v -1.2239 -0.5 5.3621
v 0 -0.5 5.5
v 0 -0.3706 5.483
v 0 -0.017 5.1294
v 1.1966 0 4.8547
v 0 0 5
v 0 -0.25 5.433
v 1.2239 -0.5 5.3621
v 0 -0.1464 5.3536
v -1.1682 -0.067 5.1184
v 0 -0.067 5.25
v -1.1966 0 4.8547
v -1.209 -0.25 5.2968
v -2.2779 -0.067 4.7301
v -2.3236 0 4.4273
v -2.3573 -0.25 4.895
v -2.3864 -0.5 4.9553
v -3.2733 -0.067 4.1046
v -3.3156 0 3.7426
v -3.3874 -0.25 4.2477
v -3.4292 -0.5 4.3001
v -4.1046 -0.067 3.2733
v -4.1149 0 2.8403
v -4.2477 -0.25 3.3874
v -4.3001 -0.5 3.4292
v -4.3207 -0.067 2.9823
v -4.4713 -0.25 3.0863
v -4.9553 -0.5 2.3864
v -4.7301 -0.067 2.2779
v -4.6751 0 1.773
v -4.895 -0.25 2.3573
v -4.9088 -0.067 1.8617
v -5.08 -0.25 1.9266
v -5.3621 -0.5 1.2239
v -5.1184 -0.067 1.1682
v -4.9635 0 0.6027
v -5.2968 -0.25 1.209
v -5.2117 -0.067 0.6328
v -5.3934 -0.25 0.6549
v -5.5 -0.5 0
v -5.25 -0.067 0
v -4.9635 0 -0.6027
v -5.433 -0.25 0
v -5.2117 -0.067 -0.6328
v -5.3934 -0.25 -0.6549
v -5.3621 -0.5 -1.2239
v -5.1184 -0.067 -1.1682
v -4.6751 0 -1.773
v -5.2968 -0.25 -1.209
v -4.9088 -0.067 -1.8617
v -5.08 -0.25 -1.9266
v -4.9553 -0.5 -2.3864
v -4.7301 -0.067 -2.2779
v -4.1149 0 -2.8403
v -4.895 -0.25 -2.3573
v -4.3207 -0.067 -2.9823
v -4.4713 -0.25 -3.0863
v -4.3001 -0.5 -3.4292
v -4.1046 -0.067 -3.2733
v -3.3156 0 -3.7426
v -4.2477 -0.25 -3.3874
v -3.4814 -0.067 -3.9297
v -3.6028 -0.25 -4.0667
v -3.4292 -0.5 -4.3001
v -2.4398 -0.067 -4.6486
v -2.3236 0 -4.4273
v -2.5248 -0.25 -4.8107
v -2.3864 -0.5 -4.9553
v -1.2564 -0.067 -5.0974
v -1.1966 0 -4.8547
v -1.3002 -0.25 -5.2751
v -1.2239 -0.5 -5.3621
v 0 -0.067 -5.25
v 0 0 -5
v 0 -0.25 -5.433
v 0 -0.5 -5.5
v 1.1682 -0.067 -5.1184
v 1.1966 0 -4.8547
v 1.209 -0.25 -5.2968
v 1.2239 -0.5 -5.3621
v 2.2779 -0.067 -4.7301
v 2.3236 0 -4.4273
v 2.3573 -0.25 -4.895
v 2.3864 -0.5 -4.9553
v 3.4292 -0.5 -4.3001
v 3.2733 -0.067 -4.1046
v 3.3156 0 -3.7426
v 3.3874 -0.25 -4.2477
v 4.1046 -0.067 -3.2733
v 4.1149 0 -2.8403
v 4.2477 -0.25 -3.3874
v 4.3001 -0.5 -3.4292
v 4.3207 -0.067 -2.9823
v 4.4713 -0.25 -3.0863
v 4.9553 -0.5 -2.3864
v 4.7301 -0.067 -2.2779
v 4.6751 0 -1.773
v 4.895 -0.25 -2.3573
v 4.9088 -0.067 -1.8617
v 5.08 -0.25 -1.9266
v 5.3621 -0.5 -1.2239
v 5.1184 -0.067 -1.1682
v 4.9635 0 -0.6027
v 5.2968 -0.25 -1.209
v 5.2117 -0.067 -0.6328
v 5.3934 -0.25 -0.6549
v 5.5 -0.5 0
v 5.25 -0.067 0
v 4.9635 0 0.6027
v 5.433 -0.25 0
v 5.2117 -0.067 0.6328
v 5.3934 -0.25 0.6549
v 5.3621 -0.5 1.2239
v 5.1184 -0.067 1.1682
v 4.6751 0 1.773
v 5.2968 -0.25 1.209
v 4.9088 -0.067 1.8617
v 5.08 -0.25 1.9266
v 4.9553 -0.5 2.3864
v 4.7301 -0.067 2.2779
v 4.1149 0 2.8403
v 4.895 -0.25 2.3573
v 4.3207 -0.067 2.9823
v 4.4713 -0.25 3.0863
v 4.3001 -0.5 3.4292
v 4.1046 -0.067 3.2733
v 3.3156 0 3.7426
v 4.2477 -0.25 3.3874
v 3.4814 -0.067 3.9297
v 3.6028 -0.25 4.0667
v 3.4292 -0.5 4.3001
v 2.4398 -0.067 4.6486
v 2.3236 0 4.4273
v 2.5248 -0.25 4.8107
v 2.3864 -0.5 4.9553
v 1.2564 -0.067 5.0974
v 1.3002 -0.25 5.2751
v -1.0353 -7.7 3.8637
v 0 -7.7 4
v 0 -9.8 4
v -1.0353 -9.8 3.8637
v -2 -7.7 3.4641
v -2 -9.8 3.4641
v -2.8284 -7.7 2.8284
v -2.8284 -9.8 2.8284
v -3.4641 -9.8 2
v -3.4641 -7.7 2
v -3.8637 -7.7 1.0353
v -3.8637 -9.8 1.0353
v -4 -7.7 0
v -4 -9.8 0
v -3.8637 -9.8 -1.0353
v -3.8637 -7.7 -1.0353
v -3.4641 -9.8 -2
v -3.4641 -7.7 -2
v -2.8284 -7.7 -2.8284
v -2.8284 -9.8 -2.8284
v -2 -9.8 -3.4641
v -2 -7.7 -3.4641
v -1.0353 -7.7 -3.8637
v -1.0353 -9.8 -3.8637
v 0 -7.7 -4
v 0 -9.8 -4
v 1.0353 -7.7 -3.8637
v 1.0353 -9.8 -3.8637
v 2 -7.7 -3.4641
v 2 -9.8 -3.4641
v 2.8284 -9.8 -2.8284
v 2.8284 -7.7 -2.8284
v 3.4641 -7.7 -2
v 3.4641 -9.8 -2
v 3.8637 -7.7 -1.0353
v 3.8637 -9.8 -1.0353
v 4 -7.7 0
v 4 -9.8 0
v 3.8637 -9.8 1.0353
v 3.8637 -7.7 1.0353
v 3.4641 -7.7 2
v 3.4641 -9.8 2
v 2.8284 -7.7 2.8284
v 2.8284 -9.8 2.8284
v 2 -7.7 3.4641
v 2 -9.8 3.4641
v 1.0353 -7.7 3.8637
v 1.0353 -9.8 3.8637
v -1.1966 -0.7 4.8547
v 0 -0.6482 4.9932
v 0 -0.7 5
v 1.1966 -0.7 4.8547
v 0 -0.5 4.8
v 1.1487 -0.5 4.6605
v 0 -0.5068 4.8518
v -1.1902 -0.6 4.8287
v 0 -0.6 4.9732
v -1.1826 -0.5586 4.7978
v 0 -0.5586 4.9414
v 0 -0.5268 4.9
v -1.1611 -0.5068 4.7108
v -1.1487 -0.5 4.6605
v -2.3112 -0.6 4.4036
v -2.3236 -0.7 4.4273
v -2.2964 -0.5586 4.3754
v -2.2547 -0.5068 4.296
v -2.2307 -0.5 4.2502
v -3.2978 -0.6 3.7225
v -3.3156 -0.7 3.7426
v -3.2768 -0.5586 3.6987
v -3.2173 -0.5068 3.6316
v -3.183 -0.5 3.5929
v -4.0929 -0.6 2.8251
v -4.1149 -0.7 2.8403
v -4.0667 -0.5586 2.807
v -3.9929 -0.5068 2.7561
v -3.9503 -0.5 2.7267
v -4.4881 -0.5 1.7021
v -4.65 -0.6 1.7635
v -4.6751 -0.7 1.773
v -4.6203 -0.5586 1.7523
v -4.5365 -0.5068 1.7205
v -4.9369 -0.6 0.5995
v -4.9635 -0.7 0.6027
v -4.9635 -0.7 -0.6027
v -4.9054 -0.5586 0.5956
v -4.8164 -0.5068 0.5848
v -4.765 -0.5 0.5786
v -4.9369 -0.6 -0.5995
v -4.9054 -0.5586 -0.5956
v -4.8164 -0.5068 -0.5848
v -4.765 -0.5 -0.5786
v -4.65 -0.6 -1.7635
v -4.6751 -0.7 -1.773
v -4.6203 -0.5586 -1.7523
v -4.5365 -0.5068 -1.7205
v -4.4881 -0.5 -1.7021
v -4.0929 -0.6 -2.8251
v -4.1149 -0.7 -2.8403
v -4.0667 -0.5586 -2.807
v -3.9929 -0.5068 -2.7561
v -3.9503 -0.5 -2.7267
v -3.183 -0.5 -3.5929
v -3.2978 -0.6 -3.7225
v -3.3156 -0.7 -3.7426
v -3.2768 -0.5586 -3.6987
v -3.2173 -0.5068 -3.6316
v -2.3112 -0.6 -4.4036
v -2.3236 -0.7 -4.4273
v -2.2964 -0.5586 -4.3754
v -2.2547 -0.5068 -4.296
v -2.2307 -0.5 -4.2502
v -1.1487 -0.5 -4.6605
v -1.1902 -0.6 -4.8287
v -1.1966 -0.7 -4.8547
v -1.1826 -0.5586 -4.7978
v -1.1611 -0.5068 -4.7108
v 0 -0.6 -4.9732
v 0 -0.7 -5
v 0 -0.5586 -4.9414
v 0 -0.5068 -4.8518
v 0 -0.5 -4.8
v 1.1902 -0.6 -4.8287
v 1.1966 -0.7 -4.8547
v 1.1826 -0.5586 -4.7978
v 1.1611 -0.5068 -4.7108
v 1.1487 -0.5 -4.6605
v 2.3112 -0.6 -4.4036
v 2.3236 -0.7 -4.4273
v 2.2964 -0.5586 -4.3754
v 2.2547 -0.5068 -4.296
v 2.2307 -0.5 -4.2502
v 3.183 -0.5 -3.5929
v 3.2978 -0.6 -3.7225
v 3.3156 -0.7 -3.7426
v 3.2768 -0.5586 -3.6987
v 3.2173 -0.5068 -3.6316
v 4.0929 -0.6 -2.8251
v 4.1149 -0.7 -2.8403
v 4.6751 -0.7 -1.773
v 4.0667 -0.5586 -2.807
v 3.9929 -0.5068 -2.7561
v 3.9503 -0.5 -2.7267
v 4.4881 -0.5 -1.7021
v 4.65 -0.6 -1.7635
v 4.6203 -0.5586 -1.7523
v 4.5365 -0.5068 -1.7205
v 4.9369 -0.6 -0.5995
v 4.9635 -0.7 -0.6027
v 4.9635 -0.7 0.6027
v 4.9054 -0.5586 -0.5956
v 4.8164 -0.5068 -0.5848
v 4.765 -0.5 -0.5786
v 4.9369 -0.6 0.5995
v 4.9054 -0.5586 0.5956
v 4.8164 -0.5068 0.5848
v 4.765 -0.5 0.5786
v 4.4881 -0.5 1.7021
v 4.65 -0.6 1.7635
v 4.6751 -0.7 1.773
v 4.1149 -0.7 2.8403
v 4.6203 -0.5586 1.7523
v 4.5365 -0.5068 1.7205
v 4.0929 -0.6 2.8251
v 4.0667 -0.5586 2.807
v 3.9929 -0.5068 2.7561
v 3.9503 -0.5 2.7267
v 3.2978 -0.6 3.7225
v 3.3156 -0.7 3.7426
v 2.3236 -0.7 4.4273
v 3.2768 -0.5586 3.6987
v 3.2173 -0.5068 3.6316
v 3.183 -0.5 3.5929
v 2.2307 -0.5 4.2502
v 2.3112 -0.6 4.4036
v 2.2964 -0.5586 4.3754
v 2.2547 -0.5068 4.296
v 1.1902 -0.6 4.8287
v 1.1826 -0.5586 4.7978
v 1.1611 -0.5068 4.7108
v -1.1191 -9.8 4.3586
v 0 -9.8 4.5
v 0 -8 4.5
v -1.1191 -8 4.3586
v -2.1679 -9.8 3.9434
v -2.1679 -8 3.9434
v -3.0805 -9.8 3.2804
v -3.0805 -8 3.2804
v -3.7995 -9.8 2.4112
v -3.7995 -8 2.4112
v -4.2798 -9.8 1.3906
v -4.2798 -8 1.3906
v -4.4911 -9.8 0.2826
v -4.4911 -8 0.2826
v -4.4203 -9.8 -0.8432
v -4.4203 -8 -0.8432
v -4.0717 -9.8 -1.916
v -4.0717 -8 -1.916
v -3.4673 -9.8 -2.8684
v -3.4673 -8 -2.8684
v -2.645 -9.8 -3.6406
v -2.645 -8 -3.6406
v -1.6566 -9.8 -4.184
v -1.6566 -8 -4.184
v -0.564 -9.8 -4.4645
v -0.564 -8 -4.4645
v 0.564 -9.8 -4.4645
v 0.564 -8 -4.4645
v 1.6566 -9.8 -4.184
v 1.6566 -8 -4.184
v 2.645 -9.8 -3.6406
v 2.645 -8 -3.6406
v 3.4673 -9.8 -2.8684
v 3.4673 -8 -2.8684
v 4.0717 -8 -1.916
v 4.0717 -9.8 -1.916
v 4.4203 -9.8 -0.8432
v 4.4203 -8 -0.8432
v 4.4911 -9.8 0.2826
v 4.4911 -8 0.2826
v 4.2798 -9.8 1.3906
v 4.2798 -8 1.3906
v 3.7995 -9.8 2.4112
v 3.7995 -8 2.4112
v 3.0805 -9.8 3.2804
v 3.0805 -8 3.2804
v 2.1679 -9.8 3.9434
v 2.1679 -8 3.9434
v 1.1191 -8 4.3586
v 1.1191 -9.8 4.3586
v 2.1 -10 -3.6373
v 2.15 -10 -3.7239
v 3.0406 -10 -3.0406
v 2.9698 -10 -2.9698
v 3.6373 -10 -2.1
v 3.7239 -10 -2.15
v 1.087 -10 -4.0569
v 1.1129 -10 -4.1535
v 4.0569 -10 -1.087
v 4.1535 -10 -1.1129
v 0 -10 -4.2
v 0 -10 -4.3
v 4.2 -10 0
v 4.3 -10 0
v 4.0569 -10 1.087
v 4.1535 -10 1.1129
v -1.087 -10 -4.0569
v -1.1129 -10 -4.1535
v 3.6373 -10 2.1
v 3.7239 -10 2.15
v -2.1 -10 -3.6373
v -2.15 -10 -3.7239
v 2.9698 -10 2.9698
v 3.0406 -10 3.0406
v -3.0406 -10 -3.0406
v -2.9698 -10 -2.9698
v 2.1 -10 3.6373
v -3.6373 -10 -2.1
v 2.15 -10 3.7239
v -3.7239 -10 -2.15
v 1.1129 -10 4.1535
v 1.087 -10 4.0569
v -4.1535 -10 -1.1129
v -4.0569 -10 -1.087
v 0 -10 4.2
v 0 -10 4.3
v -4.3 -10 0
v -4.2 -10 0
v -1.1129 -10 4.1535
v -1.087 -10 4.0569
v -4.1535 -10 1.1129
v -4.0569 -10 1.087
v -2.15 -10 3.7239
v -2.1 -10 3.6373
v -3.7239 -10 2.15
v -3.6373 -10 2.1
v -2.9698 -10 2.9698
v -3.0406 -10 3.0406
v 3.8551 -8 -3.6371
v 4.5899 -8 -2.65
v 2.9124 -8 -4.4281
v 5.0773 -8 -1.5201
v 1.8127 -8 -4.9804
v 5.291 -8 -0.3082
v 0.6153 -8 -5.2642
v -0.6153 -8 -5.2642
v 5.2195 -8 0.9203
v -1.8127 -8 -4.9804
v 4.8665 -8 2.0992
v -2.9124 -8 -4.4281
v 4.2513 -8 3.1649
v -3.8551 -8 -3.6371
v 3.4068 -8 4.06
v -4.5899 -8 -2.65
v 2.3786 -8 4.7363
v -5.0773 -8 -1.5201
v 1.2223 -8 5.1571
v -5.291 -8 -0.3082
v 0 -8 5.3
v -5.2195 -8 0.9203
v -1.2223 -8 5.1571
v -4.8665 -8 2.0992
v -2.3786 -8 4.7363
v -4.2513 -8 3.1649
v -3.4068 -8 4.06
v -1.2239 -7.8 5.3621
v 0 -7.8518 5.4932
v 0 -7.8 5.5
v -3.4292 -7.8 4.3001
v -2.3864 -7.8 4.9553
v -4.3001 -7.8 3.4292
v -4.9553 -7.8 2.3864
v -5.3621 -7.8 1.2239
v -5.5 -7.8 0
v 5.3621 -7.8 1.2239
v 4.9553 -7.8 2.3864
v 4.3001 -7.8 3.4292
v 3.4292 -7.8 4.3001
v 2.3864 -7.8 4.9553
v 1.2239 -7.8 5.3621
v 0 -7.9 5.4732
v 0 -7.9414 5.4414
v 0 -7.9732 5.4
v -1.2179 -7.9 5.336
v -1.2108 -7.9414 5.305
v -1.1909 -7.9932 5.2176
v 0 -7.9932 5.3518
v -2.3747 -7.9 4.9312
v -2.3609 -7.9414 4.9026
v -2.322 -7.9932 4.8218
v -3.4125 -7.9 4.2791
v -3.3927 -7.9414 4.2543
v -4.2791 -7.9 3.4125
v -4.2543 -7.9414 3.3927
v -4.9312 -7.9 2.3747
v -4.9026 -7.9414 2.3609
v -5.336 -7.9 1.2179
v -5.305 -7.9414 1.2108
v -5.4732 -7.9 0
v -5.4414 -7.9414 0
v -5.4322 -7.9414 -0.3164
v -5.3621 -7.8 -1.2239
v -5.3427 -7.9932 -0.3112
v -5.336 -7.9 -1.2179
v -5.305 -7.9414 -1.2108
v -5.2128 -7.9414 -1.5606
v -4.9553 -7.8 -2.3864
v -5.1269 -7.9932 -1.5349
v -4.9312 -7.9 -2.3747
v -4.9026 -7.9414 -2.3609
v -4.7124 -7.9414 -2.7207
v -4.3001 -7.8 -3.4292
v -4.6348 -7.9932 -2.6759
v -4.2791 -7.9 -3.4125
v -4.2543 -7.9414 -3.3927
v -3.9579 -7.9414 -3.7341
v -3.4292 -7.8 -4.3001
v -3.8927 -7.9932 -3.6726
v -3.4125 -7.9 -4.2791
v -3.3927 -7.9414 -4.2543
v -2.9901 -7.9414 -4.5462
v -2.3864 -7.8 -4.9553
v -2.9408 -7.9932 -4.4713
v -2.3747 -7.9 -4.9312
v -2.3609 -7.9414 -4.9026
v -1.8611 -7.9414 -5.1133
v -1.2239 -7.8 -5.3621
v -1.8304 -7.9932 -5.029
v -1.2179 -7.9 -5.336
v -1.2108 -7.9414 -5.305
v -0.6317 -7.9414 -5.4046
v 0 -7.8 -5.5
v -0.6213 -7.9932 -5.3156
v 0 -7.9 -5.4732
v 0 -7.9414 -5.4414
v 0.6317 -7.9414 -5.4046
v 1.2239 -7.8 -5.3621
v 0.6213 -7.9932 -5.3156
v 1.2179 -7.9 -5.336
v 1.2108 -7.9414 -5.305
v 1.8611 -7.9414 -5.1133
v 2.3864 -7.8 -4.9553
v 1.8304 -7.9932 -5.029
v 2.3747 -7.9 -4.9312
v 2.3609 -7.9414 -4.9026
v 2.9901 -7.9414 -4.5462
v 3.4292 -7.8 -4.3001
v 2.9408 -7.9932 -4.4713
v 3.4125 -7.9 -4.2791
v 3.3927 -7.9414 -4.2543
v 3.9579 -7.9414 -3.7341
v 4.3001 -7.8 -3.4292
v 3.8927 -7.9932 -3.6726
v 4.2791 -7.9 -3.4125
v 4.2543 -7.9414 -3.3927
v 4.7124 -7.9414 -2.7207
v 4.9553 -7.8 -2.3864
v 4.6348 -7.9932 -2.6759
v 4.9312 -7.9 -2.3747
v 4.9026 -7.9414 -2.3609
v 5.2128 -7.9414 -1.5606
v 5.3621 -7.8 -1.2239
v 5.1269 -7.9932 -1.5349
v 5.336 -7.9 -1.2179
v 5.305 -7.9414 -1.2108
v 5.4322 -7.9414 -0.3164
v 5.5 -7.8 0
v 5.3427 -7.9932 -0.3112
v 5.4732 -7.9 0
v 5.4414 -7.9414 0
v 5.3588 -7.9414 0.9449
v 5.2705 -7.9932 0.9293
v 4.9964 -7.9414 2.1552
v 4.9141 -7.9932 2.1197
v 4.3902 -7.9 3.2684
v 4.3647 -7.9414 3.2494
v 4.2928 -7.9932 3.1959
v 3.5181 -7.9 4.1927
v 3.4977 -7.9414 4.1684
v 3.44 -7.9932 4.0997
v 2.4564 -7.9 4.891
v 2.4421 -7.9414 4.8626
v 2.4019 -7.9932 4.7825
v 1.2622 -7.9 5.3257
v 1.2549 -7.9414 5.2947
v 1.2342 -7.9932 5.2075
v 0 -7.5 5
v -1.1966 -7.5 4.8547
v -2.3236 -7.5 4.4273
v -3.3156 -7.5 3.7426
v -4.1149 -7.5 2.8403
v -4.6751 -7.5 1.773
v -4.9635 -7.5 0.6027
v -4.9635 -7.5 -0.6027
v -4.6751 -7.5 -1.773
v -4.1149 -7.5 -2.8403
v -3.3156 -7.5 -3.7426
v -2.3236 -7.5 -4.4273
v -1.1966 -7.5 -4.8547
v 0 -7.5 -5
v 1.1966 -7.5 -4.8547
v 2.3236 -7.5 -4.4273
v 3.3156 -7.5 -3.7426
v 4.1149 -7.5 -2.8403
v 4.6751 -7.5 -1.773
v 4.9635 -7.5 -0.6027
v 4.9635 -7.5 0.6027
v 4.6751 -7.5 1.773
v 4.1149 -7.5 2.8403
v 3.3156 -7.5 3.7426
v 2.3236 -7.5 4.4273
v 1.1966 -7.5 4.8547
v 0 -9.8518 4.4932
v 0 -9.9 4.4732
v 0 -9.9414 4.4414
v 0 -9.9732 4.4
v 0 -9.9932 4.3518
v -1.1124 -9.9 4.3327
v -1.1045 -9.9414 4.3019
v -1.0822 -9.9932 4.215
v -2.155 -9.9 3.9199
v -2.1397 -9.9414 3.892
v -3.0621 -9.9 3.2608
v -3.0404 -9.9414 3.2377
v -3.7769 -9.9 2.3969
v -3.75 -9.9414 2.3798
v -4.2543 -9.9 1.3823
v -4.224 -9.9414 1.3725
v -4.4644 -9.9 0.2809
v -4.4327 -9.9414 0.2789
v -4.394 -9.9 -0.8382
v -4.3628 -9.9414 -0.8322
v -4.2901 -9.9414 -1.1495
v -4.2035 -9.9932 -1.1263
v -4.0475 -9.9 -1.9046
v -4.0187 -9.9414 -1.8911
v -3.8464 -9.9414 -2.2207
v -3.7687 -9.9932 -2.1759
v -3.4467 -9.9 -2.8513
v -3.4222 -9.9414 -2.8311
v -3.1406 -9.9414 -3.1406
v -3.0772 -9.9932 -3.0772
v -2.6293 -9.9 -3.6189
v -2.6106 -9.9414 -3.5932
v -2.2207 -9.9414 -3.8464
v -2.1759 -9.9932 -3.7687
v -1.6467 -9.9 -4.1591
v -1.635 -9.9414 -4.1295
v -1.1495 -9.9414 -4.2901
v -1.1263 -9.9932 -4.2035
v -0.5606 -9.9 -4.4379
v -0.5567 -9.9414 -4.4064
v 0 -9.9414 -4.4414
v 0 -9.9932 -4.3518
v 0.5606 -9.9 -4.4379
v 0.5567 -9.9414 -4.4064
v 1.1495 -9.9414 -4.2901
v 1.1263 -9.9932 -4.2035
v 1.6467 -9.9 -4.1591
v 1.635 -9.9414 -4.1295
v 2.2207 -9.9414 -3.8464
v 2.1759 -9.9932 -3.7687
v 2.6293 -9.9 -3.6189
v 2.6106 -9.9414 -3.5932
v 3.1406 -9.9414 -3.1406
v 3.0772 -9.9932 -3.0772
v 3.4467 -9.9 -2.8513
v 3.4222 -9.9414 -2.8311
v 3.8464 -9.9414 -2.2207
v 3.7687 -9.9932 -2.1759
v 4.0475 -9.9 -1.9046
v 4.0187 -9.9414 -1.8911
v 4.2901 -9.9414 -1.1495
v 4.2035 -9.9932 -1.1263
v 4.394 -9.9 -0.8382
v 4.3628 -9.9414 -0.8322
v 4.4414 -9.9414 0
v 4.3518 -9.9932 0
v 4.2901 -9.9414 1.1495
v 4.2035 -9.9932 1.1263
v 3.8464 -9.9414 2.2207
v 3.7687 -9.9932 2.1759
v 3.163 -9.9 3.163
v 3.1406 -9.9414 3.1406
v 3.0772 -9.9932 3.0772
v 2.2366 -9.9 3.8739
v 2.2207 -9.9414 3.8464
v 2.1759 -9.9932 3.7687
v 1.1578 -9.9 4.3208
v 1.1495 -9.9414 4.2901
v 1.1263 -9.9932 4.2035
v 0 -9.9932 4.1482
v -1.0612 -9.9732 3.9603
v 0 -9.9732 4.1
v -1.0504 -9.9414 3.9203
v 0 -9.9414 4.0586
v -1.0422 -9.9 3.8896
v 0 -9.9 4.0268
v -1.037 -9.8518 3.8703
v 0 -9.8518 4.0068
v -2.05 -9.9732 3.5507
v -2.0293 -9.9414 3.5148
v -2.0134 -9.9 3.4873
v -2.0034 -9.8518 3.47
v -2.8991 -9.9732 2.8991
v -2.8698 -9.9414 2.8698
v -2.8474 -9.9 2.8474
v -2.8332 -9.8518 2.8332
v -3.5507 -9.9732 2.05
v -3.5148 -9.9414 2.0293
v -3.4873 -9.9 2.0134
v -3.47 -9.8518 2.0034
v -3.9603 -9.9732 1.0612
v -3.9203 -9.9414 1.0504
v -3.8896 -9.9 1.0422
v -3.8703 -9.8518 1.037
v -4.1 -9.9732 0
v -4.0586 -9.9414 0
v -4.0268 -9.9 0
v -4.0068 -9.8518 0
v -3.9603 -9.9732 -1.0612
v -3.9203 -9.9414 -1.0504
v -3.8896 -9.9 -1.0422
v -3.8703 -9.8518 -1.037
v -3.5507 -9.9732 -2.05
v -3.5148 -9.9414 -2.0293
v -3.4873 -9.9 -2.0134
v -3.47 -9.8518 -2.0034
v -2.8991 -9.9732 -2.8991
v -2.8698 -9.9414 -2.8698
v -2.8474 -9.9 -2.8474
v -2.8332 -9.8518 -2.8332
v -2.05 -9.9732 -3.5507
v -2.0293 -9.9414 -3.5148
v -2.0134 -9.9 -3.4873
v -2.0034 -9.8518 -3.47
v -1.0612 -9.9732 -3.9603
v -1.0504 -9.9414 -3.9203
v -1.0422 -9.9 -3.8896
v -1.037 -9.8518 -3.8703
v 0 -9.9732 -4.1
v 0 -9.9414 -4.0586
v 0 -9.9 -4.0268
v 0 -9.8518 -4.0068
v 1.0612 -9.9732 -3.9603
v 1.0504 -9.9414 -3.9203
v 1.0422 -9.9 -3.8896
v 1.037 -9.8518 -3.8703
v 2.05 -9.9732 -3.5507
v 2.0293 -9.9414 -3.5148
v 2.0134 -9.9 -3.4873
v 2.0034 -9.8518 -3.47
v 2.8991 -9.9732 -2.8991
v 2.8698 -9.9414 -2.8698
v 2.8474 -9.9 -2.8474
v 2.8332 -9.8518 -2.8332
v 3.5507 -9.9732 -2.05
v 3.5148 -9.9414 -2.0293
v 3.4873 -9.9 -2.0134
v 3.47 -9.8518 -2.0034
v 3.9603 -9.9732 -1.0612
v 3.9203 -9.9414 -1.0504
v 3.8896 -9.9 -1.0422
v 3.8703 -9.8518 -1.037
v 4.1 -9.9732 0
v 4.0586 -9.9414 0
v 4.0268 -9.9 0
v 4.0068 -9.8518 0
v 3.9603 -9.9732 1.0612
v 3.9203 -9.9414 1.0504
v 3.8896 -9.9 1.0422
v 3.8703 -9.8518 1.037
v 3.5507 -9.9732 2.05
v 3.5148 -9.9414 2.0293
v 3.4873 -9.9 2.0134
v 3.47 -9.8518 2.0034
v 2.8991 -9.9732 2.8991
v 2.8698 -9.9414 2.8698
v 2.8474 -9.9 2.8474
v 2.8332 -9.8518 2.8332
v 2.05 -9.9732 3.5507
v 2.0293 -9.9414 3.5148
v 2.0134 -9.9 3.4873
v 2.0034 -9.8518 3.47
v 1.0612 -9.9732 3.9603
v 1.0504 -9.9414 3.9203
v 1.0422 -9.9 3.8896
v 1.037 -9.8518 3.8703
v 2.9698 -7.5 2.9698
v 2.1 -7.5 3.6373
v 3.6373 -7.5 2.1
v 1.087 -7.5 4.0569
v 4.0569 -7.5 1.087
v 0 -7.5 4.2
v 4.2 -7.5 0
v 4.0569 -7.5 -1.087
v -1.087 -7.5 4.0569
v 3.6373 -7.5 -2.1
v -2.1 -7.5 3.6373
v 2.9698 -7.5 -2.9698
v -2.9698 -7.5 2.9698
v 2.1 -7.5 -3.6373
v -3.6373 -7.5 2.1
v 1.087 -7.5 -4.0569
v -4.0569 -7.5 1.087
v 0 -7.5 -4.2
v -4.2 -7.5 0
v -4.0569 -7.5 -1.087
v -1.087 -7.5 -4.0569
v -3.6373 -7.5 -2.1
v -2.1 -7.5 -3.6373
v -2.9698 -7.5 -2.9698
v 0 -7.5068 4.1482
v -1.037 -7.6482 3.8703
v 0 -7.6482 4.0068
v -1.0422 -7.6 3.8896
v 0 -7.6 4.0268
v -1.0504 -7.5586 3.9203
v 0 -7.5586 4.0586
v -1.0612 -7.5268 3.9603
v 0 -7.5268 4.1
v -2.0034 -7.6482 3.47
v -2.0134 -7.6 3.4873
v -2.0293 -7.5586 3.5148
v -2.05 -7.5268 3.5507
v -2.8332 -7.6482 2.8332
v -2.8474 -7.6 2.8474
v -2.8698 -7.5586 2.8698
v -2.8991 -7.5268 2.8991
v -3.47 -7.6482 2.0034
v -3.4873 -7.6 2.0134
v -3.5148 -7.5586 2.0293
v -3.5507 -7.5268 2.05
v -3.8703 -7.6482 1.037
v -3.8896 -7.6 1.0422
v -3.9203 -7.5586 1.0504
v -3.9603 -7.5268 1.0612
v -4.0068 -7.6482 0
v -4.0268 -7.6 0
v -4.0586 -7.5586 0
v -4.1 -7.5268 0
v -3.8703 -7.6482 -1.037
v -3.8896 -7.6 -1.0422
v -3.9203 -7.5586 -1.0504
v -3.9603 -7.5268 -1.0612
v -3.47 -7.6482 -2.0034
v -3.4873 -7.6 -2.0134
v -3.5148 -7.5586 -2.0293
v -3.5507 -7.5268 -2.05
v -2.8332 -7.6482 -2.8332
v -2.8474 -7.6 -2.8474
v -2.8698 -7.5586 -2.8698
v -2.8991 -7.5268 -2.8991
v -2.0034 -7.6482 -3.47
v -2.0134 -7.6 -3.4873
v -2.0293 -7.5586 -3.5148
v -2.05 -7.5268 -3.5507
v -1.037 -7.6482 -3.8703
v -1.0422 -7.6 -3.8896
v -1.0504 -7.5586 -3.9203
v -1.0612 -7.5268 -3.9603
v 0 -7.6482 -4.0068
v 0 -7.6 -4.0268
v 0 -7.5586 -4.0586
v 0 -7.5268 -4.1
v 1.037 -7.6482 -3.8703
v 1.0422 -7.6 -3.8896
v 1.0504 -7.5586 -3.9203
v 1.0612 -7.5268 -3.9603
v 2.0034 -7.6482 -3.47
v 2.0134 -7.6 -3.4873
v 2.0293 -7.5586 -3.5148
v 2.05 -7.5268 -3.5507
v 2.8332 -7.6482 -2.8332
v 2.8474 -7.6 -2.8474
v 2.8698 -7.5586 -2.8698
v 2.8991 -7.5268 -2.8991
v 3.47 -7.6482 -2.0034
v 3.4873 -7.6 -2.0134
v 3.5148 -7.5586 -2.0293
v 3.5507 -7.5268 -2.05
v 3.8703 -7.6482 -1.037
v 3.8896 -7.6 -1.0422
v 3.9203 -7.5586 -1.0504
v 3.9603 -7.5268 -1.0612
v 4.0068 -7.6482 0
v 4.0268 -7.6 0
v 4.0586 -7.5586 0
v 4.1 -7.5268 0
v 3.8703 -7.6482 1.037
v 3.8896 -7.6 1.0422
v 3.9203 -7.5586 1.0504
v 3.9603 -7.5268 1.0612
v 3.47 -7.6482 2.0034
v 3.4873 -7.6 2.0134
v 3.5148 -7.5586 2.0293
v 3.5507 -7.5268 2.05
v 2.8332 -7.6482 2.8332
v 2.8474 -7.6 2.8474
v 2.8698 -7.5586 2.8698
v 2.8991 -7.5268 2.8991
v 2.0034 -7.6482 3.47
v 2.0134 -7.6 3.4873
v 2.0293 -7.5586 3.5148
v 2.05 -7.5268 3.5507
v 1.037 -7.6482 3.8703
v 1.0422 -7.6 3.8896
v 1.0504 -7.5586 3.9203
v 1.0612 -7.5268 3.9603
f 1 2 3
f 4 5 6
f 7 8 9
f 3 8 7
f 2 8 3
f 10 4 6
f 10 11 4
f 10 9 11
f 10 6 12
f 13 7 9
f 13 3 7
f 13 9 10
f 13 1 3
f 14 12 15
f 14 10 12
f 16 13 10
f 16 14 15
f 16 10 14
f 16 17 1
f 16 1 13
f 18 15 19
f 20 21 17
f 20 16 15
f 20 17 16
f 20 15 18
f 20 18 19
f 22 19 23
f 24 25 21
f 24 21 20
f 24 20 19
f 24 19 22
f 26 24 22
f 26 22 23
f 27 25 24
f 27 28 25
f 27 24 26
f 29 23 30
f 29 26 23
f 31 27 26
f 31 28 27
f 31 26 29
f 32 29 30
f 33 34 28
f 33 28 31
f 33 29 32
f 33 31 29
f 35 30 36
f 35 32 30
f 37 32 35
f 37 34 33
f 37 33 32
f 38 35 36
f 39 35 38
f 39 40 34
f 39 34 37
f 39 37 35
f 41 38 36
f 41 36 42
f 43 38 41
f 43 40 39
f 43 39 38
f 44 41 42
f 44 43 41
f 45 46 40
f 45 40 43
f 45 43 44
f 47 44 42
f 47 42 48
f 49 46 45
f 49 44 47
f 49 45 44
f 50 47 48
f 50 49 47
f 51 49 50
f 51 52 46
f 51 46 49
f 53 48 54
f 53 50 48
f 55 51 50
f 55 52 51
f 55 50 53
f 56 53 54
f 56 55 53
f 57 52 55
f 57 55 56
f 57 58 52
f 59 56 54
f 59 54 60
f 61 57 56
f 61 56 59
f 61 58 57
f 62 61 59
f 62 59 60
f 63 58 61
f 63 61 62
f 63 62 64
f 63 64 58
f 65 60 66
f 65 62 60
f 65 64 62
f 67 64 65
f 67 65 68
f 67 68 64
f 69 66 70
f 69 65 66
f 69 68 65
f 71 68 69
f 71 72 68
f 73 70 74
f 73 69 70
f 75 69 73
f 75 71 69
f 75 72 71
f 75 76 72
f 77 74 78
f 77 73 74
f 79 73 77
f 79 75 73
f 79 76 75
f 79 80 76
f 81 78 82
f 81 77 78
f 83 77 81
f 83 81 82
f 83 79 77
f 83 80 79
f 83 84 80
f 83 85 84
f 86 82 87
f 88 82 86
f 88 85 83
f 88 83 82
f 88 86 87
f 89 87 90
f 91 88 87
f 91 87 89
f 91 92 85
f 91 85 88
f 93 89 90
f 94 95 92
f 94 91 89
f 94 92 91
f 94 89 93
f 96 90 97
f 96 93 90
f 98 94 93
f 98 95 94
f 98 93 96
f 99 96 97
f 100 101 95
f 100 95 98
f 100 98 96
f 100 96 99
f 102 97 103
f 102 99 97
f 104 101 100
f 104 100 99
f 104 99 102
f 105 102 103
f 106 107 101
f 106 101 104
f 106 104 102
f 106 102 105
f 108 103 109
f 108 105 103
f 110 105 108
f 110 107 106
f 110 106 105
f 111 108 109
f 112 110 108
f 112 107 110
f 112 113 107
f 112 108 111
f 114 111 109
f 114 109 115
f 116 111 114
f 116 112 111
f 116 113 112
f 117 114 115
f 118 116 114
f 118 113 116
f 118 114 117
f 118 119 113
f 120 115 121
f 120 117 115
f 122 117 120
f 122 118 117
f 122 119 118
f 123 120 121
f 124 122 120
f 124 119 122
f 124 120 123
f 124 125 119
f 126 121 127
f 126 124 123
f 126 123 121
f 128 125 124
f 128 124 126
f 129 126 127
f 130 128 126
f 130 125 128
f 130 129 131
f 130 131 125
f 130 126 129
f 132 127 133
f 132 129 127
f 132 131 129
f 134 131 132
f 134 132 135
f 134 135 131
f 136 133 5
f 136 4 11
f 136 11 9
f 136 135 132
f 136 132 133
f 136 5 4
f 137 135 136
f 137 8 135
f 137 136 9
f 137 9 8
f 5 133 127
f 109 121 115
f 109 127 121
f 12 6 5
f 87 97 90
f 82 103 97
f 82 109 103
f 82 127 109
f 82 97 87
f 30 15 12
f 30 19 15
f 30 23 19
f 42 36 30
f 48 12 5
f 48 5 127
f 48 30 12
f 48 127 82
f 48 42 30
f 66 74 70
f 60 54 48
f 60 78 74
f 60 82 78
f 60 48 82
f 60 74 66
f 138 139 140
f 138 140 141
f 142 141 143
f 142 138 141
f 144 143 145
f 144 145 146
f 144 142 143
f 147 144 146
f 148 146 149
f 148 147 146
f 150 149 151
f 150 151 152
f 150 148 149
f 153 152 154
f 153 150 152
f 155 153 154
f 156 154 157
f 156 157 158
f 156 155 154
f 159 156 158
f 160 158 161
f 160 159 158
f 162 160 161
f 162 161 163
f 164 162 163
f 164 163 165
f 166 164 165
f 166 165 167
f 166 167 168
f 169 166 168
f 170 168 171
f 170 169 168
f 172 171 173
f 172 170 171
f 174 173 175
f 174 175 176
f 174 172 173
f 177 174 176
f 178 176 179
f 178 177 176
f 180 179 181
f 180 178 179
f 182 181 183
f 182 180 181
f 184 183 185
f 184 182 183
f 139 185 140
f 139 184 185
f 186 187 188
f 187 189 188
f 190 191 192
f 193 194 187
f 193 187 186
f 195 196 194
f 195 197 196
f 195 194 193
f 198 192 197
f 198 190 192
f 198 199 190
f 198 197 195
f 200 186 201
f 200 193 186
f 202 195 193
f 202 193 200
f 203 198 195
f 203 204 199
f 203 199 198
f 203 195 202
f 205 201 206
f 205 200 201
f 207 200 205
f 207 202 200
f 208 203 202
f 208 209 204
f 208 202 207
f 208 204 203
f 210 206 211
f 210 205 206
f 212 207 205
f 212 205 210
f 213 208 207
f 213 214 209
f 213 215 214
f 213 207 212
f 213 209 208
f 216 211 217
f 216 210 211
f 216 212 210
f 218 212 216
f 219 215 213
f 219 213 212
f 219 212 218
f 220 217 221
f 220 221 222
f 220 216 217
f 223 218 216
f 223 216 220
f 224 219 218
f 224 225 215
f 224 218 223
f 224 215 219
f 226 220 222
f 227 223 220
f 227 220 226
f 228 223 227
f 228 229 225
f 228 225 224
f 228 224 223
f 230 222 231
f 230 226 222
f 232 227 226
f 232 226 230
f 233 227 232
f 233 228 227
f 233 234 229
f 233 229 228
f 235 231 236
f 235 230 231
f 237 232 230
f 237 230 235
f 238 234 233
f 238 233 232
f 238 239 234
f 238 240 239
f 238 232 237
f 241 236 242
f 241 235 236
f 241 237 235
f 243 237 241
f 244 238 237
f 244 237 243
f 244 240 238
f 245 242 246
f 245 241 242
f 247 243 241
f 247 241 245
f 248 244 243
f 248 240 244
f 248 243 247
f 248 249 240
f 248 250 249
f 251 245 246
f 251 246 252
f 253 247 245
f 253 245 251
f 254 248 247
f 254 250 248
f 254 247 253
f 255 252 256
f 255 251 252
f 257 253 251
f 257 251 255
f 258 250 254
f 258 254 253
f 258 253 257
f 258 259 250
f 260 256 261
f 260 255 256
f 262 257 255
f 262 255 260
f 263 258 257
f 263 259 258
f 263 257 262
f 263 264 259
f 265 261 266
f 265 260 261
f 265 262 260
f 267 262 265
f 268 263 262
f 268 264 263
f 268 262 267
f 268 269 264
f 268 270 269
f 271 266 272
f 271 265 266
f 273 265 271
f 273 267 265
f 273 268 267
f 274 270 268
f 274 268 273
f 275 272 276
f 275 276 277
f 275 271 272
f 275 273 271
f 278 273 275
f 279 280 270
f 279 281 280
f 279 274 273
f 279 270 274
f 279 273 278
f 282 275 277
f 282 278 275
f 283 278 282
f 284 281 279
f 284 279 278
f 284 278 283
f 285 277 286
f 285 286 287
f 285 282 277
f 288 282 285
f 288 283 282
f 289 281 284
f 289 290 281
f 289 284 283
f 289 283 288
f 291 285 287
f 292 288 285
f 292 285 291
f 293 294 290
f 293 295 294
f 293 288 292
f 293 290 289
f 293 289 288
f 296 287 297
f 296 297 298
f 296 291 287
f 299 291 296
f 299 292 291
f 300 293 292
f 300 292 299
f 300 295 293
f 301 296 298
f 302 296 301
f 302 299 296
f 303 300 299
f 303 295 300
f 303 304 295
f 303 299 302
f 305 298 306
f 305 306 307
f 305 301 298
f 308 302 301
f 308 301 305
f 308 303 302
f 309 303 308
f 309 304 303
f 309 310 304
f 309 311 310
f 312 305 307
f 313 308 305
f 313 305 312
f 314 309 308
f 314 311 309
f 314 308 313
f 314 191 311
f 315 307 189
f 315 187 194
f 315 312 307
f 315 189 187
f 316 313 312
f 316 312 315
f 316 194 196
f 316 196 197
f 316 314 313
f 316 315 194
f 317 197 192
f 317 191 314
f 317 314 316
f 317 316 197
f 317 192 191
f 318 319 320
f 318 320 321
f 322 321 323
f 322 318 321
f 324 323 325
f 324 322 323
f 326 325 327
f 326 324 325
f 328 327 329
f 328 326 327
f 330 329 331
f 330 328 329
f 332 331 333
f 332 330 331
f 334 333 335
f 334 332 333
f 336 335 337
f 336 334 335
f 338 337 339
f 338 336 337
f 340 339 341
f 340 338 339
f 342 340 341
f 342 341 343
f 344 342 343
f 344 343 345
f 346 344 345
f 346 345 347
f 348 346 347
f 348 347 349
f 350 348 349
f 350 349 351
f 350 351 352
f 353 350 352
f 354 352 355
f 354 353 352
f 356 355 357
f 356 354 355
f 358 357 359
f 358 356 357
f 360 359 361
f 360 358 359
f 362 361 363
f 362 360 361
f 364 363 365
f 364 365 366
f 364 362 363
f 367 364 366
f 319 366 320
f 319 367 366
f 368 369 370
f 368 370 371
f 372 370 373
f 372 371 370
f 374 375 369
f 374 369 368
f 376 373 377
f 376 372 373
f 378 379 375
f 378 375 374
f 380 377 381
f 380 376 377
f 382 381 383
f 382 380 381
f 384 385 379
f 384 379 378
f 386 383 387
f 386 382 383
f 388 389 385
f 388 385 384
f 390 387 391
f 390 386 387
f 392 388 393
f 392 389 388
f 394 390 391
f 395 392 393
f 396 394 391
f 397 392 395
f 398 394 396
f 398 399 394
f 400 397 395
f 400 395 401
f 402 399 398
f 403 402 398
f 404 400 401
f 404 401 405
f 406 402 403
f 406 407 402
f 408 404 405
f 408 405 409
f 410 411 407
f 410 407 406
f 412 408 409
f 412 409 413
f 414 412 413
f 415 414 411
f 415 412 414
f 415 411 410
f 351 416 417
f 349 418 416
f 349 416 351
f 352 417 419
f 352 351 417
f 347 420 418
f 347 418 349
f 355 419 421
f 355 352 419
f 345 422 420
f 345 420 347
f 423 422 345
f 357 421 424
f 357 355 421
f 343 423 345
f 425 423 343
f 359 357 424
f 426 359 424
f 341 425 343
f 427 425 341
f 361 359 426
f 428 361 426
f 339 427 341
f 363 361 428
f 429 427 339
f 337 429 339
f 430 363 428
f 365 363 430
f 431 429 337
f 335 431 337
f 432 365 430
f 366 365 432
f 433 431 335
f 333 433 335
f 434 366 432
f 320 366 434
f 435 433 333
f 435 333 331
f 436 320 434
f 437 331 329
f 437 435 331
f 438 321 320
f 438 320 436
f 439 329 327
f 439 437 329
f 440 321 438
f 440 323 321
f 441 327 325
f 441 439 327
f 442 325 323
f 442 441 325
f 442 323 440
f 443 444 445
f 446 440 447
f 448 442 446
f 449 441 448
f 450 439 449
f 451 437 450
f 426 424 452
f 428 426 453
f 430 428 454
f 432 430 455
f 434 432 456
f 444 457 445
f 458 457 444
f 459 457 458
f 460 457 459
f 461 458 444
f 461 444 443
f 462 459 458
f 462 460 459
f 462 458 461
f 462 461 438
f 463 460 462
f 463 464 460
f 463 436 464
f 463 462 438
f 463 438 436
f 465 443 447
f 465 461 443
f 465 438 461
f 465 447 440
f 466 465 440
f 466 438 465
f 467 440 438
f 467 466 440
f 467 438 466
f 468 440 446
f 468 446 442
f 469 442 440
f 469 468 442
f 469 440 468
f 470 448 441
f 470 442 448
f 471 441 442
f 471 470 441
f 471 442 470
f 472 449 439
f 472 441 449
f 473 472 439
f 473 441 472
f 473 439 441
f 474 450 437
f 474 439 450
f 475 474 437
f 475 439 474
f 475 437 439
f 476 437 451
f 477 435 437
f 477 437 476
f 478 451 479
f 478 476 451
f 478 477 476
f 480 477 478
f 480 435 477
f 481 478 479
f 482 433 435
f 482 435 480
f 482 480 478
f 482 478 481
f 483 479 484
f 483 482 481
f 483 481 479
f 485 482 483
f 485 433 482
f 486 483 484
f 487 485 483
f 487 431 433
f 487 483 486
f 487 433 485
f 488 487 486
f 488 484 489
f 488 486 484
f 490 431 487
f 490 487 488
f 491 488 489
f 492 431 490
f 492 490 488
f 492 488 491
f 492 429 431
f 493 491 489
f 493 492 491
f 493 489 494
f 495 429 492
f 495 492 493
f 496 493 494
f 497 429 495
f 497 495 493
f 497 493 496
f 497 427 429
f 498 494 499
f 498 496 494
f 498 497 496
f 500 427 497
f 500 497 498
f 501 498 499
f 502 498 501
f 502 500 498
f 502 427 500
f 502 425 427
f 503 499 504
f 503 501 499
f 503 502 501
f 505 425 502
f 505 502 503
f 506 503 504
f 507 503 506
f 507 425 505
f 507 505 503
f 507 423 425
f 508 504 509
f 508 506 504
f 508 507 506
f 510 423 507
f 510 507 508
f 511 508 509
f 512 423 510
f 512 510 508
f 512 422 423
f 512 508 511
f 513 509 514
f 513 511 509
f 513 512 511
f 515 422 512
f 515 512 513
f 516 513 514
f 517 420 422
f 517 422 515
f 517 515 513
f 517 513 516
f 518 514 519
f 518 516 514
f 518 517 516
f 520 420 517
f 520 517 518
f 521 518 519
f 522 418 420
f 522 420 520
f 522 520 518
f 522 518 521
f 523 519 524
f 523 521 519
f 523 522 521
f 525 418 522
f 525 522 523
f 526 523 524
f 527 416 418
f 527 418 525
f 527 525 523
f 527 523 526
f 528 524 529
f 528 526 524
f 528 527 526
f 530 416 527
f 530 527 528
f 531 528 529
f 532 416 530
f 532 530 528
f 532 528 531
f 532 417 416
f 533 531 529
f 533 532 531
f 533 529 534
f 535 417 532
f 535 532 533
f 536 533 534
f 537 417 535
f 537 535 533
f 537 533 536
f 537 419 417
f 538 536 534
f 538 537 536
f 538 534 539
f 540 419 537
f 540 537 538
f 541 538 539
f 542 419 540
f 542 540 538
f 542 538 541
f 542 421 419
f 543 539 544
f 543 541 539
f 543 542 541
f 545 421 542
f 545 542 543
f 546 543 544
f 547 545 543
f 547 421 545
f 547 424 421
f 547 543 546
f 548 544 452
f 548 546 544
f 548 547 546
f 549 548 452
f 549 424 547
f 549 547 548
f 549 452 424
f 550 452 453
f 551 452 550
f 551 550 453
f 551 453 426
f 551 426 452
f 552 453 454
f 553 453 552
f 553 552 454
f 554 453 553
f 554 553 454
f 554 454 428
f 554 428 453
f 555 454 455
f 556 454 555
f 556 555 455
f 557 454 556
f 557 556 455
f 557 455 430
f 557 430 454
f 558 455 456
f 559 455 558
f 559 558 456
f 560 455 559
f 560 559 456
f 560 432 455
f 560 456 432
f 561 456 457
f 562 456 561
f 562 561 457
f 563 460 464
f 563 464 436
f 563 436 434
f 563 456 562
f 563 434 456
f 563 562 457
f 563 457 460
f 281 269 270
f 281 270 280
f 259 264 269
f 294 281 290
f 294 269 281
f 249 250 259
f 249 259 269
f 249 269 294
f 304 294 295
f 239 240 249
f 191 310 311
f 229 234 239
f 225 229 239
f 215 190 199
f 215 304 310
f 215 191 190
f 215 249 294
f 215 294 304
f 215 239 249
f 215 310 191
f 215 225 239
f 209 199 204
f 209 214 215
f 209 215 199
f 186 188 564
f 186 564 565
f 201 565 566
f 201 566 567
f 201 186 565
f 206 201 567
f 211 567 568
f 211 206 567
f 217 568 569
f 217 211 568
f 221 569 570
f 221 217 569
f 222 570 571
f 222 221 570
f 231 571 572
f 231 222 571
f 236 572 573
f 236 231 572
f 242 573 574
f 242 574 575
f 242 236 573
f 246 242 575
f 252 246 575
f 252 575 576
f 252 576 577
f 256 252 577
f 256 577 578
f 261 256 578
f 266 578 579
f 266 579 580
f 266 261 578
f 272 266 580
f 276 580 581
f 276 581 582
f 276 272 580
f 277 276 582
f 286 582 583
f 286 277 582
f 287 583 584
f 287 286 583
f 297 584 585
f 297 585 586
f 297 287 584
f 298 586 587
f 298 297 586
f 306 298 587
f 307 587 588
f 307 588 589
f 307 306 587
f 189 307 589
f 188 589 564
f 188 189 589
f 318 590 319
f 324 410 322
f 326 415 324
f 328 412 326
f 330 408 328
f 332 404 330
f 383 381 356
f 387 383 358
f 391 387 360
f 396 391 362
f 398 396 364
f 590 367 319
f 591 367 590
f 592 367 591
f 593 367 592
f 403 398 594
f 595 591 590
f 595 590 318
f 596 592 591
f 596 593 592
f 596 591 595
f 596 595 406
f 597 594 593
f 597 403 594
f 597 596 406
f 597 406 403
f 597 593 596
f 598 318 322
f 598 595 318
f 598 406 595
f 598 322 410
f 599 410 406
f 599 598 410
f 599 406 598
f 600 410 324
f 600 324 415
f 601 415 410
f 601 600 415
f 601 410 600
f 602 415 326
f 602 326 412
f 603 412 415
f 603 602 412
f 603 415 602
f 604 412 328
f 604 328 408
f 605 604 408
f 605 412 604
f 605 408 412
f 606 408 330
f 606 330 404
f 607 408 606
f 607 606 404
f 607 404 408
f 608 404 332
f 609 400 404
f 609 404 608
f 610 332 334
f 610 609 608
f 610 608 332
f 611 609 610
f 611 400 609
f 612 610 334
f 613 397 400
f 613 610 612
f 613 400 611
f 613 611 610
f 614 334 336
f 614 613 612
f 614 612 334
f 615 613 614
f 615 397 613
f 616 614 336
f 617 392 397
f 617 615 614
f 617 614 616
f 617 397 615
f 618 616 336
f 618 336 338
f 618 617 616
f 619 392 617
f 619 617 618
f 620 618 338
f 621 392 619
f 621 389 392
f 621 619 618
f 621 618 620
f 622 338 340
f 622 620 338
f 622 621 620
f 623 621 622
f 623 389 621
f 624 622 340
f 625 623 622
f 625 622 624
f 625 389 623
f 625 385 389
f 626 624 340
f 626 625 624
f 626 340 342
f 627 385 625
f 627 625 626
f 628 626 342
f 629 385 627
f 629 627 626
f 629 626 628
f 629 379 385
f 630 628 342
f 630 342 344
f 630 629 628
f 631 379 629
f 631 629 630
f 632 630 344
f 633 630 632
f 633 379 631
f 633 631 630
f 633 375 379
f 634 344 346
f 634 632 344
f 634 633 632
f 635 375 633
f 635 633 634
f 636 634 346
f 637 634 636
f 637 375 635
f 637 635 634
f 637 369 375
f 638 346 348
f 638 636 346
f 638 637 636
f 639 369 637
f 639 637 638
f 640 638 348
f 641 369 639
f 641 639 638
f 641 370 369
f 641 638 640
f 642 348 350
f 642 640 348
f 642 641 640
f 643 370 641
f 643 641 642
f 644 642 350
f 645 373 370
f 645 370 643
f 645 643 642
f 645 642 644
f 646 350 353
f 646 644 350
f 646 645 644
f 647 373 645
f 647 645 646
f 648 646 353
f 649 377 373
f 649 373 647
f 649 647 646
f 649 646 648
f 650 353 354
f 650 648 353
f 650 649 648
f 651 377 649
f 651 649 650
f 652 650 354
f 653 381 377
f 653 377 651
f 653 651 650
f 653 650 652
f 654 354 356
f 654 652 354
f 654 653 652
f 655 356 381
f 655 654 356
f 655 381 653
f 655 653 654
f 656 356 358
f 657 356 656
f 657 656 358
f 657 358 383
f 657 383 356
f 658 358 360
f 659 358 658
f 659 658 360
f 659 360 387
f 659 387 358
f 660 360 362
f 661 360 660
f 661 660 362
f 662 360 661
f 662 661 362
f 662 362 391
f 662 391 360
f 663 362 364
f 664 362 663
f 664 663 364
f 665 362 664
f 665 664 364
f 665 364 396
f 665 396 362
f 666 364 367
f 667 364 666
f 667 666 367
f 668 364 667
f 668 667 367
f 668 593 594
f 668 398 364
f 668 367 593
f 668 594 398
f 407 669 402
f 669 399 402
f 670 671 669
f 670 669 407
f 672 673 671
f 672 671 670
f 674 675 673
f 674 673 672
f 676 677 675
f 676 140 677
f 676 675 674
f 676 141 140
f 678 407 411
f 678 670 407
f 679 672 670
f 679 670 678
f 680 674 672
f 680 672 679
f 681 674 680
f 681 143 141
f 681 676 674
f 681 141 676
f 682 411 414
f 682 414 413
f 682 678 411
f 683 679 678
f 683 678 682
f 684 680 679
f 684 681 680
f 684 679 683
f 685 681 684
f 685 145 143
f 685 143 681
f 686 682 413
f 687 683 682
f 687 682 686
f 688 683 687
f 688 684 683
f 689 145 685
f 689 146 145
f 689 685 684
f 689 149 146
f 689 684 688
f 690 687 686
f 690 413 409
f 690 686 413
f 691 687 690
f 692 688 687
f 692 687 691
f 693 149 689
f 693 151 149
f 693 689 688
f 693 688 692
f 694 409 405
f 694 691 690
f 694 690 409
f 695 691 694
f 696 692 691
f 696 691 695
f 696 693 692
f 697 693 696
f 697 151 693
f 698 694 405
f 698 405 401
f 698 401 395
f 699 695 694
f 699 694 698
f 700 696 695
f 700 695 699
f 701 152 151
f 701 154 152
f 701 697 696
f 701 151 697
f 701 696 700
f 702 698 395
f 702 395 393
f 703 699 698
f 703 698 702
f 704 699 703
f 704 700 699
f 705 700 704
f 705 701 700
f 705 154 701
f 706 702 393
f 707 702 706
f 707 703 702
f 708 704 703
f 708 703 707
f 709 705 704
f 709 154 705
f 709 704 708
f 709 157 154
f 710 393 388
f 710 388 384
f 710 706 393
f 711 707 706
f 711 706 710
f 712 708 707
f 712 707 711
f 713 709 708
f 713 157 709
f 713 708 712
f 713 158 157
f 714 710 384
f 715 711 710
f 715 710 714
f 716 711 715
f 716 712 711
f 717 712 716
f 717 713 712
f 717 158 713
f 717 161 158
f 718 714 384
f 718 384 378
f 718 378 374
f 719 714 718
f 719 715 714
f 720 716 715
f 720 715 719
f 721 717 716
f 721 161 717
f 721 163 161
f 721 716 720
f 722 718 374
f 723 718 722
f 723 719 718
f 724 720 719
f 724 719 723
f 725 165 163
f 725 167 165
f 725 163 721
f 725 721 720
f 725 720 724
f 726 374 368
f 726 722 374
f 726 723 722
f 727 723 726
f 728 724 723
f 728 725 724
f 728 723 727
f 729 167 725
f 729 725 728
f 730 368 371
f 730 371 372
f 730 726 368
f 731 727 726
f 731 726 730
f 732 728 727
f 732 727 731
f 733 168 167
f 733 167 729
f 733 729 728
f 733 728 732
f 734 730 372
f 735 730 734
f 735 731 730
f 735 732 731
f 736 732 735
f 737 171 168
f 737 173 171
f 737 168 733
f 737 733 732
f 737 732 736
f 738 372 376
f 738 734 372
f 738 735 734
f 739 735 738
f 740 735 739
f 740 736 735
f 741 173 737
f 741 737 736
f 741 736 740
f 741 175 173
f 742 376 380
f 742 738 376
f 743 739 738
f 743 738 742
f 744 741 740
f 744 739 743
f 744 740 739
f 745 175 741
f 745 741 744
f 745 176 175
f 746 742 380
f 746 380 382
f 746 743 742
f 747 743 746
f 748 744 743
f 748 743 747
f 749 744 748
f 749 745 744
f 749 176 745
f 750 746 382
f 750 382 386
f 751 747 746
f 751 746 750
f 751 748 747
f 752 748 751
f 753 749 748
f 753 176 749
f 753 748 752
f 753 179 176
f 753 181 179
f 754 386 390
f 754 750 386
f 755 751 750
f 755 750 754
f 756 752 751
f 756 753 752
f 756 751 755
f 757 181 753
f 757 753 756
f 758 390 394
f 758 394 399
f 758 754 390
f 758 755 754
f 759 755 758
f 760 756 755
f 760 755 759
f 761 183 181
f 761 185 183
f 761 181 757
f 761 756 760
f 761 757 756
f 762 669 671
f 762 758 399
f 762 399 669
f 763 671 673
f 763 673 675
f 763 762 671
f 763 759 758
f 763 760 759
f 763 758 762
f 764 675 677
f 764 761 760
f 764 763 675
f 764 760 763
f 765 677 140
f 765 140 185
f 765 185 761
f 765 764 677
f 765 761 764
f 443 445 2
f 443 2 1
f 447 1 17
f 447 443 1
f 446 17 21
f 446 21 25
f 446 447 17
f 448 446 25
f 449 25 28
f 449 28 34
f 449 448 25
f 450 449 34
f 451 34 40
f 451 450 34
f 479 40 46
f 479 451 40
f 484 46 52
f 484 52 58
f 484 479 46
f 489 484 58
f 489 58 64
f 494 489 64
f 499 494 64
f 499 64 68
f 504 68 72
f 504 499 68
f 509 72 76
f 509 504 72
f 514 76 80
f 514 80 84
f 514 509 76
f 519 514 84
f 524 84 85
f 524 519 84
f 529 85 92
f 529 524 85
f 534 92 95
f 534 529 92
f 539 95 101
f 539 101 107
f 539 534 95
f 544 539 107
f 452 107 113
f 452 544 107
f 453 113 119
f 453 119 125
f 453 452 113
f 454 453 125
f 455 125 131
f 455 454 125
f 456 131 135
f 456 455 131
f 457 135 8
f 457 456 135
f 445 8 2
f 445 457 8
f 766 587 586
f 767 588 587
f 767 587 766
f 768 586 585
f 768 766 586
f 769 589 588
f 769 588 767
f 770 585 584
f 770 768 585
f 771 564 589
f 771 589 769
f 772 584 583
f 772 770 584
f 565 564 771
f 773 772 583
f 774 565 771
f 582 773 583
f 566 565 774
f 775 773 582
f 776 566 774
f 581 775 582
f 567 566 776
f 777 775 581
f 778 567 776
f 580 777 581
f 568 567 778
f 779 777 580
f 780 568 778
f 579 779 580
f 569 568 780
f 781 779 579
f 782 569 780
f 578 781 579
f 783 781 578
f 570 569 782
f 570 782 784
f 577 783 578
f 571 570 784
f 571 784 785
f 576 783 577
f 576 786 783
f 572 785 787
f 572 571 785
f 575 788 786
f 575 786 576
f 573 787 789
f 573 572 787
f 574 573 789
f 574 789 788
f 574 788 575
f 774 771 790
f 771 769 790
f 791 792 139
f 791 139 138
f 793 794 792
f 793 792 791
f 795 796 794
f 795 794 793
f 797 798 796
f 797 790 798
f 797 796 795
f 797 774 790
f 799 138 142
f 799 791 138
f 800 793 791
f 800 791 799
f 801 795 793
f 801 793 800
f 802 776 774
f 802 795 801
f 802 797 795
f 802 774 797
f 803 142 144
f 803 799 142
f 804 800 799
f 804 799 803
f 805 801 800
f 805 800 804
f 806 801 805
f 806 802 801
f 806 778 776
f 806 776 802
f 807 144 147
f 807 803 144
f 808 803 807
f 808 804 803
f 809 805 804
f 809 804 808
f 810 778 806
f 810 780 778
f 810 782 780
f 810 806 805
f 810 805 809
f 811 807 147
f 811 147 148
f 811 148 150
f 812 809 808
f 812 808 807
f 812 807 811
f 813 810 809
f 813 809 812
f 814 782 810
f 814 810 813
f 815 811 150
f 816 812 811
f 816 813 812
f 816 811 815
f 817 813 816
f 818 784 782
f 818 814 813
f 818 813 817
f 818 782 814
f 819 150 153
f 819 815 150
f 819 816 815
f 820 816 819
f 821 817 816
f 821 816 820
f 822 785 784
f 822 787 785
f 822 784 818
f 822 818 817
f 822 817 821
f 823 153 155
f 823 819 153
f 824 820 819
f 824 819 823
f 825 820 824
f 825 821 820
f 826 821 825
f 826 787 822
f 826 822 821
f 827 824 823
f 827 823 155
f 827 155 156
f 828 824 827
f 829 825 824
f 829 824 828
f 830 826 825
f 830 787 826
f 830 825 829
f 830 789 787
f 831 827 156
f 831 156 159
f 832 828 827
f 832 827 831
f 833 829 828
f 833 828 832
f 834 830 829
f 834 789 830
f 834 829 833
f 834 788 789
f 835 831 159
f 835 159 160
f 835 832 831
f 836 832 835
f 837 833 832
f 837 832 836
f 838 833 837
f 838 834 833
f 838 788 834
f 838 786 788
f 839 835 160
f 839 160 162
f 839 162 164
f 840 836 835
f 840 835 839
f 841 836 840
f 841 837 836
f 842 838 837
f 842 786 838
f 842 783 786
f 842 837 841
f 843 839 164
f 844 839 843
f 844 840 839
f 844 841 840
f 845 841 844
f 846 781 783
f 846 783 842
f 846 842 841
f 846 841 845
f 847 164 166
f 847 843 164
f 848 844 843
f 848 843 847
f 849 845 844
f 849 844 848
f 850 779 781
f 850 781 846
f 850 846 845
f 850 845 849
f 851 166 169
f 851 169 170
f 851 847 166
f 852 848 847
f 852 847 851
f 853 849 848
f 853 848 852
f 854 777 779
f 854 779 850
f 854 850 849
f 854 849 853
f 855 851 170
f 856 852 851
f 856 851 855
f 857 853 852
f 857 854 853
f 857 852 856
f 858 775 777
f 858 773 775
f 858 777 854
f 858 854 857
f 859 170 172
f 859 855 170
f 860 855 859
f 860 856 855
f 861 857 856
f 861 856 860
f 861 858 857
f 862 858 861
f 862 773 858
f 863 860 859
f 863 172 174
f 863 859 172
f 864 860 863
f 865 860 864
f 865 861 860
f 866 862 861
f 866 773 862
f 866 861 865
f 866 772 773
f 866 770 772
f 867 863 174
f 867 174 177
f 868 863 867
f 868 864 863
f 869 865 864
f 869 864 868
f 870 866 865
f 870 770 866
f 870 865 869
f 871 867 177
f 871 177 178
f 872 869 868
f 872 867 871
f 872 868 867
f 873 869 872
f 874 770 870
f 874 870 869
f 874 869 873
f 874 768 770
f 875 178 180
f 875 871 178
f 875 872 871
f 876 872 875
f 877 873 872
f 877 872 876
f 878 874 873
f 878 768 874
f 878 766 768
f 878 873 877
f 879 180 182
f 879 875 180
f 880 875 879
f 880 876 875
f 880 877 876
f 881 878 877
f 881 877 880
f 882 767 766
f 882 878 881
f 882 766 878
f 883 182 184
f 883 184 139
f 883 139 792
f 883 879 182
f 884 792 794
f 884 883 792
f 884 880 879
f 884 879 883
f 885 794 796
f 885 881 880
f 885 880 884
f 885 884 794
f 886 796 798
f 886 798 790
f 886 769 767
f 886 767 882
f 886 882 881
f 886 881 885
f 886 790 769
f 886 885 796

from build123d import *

# Parameters (mm, degrees)
FILLET1_R = 0.5
FILLET2_R = 0.2


with BuildPart() as part:
    # Sketch1 → Revolve1 (revolve)
    with BuildSketch(Plane(origin=(0, 0, 0), x_dir=(0, 0, -1), z_dir=(1, 0, 0))):
        Polygon((0, 0), (-5.5, 0), (-5.5, -8), (-4.5, -8), (-4.5, -10), (-4, -10), (-4, -7.5), (-5, -7.5), (-5, -0.5), (0, -0.5), align=None)
    revolve(axis=Axis((0, 0, 0), (0, -1, 0)))

    # Fillet1
    fillet1_edges = [part.edges().sort_by_distance(p)[0] for p in [
        (0, 0, -5.5),
    ]]
    fillet(fillet1_edges, radius=FILLET1_R)

    # Fillet2
    fillet2_edges = [part.edges().sort_by_distance(p)[0] for p in [
        (0, -0.5, -5),
        (0, -8, -5.5),
        (0, -10, -4.5),
        (0, -10, -4),
        (0, -7.5, -4),
    ]]
    fillet(fillet2_edges, radius=FILLET2_R)


solid = part.part
